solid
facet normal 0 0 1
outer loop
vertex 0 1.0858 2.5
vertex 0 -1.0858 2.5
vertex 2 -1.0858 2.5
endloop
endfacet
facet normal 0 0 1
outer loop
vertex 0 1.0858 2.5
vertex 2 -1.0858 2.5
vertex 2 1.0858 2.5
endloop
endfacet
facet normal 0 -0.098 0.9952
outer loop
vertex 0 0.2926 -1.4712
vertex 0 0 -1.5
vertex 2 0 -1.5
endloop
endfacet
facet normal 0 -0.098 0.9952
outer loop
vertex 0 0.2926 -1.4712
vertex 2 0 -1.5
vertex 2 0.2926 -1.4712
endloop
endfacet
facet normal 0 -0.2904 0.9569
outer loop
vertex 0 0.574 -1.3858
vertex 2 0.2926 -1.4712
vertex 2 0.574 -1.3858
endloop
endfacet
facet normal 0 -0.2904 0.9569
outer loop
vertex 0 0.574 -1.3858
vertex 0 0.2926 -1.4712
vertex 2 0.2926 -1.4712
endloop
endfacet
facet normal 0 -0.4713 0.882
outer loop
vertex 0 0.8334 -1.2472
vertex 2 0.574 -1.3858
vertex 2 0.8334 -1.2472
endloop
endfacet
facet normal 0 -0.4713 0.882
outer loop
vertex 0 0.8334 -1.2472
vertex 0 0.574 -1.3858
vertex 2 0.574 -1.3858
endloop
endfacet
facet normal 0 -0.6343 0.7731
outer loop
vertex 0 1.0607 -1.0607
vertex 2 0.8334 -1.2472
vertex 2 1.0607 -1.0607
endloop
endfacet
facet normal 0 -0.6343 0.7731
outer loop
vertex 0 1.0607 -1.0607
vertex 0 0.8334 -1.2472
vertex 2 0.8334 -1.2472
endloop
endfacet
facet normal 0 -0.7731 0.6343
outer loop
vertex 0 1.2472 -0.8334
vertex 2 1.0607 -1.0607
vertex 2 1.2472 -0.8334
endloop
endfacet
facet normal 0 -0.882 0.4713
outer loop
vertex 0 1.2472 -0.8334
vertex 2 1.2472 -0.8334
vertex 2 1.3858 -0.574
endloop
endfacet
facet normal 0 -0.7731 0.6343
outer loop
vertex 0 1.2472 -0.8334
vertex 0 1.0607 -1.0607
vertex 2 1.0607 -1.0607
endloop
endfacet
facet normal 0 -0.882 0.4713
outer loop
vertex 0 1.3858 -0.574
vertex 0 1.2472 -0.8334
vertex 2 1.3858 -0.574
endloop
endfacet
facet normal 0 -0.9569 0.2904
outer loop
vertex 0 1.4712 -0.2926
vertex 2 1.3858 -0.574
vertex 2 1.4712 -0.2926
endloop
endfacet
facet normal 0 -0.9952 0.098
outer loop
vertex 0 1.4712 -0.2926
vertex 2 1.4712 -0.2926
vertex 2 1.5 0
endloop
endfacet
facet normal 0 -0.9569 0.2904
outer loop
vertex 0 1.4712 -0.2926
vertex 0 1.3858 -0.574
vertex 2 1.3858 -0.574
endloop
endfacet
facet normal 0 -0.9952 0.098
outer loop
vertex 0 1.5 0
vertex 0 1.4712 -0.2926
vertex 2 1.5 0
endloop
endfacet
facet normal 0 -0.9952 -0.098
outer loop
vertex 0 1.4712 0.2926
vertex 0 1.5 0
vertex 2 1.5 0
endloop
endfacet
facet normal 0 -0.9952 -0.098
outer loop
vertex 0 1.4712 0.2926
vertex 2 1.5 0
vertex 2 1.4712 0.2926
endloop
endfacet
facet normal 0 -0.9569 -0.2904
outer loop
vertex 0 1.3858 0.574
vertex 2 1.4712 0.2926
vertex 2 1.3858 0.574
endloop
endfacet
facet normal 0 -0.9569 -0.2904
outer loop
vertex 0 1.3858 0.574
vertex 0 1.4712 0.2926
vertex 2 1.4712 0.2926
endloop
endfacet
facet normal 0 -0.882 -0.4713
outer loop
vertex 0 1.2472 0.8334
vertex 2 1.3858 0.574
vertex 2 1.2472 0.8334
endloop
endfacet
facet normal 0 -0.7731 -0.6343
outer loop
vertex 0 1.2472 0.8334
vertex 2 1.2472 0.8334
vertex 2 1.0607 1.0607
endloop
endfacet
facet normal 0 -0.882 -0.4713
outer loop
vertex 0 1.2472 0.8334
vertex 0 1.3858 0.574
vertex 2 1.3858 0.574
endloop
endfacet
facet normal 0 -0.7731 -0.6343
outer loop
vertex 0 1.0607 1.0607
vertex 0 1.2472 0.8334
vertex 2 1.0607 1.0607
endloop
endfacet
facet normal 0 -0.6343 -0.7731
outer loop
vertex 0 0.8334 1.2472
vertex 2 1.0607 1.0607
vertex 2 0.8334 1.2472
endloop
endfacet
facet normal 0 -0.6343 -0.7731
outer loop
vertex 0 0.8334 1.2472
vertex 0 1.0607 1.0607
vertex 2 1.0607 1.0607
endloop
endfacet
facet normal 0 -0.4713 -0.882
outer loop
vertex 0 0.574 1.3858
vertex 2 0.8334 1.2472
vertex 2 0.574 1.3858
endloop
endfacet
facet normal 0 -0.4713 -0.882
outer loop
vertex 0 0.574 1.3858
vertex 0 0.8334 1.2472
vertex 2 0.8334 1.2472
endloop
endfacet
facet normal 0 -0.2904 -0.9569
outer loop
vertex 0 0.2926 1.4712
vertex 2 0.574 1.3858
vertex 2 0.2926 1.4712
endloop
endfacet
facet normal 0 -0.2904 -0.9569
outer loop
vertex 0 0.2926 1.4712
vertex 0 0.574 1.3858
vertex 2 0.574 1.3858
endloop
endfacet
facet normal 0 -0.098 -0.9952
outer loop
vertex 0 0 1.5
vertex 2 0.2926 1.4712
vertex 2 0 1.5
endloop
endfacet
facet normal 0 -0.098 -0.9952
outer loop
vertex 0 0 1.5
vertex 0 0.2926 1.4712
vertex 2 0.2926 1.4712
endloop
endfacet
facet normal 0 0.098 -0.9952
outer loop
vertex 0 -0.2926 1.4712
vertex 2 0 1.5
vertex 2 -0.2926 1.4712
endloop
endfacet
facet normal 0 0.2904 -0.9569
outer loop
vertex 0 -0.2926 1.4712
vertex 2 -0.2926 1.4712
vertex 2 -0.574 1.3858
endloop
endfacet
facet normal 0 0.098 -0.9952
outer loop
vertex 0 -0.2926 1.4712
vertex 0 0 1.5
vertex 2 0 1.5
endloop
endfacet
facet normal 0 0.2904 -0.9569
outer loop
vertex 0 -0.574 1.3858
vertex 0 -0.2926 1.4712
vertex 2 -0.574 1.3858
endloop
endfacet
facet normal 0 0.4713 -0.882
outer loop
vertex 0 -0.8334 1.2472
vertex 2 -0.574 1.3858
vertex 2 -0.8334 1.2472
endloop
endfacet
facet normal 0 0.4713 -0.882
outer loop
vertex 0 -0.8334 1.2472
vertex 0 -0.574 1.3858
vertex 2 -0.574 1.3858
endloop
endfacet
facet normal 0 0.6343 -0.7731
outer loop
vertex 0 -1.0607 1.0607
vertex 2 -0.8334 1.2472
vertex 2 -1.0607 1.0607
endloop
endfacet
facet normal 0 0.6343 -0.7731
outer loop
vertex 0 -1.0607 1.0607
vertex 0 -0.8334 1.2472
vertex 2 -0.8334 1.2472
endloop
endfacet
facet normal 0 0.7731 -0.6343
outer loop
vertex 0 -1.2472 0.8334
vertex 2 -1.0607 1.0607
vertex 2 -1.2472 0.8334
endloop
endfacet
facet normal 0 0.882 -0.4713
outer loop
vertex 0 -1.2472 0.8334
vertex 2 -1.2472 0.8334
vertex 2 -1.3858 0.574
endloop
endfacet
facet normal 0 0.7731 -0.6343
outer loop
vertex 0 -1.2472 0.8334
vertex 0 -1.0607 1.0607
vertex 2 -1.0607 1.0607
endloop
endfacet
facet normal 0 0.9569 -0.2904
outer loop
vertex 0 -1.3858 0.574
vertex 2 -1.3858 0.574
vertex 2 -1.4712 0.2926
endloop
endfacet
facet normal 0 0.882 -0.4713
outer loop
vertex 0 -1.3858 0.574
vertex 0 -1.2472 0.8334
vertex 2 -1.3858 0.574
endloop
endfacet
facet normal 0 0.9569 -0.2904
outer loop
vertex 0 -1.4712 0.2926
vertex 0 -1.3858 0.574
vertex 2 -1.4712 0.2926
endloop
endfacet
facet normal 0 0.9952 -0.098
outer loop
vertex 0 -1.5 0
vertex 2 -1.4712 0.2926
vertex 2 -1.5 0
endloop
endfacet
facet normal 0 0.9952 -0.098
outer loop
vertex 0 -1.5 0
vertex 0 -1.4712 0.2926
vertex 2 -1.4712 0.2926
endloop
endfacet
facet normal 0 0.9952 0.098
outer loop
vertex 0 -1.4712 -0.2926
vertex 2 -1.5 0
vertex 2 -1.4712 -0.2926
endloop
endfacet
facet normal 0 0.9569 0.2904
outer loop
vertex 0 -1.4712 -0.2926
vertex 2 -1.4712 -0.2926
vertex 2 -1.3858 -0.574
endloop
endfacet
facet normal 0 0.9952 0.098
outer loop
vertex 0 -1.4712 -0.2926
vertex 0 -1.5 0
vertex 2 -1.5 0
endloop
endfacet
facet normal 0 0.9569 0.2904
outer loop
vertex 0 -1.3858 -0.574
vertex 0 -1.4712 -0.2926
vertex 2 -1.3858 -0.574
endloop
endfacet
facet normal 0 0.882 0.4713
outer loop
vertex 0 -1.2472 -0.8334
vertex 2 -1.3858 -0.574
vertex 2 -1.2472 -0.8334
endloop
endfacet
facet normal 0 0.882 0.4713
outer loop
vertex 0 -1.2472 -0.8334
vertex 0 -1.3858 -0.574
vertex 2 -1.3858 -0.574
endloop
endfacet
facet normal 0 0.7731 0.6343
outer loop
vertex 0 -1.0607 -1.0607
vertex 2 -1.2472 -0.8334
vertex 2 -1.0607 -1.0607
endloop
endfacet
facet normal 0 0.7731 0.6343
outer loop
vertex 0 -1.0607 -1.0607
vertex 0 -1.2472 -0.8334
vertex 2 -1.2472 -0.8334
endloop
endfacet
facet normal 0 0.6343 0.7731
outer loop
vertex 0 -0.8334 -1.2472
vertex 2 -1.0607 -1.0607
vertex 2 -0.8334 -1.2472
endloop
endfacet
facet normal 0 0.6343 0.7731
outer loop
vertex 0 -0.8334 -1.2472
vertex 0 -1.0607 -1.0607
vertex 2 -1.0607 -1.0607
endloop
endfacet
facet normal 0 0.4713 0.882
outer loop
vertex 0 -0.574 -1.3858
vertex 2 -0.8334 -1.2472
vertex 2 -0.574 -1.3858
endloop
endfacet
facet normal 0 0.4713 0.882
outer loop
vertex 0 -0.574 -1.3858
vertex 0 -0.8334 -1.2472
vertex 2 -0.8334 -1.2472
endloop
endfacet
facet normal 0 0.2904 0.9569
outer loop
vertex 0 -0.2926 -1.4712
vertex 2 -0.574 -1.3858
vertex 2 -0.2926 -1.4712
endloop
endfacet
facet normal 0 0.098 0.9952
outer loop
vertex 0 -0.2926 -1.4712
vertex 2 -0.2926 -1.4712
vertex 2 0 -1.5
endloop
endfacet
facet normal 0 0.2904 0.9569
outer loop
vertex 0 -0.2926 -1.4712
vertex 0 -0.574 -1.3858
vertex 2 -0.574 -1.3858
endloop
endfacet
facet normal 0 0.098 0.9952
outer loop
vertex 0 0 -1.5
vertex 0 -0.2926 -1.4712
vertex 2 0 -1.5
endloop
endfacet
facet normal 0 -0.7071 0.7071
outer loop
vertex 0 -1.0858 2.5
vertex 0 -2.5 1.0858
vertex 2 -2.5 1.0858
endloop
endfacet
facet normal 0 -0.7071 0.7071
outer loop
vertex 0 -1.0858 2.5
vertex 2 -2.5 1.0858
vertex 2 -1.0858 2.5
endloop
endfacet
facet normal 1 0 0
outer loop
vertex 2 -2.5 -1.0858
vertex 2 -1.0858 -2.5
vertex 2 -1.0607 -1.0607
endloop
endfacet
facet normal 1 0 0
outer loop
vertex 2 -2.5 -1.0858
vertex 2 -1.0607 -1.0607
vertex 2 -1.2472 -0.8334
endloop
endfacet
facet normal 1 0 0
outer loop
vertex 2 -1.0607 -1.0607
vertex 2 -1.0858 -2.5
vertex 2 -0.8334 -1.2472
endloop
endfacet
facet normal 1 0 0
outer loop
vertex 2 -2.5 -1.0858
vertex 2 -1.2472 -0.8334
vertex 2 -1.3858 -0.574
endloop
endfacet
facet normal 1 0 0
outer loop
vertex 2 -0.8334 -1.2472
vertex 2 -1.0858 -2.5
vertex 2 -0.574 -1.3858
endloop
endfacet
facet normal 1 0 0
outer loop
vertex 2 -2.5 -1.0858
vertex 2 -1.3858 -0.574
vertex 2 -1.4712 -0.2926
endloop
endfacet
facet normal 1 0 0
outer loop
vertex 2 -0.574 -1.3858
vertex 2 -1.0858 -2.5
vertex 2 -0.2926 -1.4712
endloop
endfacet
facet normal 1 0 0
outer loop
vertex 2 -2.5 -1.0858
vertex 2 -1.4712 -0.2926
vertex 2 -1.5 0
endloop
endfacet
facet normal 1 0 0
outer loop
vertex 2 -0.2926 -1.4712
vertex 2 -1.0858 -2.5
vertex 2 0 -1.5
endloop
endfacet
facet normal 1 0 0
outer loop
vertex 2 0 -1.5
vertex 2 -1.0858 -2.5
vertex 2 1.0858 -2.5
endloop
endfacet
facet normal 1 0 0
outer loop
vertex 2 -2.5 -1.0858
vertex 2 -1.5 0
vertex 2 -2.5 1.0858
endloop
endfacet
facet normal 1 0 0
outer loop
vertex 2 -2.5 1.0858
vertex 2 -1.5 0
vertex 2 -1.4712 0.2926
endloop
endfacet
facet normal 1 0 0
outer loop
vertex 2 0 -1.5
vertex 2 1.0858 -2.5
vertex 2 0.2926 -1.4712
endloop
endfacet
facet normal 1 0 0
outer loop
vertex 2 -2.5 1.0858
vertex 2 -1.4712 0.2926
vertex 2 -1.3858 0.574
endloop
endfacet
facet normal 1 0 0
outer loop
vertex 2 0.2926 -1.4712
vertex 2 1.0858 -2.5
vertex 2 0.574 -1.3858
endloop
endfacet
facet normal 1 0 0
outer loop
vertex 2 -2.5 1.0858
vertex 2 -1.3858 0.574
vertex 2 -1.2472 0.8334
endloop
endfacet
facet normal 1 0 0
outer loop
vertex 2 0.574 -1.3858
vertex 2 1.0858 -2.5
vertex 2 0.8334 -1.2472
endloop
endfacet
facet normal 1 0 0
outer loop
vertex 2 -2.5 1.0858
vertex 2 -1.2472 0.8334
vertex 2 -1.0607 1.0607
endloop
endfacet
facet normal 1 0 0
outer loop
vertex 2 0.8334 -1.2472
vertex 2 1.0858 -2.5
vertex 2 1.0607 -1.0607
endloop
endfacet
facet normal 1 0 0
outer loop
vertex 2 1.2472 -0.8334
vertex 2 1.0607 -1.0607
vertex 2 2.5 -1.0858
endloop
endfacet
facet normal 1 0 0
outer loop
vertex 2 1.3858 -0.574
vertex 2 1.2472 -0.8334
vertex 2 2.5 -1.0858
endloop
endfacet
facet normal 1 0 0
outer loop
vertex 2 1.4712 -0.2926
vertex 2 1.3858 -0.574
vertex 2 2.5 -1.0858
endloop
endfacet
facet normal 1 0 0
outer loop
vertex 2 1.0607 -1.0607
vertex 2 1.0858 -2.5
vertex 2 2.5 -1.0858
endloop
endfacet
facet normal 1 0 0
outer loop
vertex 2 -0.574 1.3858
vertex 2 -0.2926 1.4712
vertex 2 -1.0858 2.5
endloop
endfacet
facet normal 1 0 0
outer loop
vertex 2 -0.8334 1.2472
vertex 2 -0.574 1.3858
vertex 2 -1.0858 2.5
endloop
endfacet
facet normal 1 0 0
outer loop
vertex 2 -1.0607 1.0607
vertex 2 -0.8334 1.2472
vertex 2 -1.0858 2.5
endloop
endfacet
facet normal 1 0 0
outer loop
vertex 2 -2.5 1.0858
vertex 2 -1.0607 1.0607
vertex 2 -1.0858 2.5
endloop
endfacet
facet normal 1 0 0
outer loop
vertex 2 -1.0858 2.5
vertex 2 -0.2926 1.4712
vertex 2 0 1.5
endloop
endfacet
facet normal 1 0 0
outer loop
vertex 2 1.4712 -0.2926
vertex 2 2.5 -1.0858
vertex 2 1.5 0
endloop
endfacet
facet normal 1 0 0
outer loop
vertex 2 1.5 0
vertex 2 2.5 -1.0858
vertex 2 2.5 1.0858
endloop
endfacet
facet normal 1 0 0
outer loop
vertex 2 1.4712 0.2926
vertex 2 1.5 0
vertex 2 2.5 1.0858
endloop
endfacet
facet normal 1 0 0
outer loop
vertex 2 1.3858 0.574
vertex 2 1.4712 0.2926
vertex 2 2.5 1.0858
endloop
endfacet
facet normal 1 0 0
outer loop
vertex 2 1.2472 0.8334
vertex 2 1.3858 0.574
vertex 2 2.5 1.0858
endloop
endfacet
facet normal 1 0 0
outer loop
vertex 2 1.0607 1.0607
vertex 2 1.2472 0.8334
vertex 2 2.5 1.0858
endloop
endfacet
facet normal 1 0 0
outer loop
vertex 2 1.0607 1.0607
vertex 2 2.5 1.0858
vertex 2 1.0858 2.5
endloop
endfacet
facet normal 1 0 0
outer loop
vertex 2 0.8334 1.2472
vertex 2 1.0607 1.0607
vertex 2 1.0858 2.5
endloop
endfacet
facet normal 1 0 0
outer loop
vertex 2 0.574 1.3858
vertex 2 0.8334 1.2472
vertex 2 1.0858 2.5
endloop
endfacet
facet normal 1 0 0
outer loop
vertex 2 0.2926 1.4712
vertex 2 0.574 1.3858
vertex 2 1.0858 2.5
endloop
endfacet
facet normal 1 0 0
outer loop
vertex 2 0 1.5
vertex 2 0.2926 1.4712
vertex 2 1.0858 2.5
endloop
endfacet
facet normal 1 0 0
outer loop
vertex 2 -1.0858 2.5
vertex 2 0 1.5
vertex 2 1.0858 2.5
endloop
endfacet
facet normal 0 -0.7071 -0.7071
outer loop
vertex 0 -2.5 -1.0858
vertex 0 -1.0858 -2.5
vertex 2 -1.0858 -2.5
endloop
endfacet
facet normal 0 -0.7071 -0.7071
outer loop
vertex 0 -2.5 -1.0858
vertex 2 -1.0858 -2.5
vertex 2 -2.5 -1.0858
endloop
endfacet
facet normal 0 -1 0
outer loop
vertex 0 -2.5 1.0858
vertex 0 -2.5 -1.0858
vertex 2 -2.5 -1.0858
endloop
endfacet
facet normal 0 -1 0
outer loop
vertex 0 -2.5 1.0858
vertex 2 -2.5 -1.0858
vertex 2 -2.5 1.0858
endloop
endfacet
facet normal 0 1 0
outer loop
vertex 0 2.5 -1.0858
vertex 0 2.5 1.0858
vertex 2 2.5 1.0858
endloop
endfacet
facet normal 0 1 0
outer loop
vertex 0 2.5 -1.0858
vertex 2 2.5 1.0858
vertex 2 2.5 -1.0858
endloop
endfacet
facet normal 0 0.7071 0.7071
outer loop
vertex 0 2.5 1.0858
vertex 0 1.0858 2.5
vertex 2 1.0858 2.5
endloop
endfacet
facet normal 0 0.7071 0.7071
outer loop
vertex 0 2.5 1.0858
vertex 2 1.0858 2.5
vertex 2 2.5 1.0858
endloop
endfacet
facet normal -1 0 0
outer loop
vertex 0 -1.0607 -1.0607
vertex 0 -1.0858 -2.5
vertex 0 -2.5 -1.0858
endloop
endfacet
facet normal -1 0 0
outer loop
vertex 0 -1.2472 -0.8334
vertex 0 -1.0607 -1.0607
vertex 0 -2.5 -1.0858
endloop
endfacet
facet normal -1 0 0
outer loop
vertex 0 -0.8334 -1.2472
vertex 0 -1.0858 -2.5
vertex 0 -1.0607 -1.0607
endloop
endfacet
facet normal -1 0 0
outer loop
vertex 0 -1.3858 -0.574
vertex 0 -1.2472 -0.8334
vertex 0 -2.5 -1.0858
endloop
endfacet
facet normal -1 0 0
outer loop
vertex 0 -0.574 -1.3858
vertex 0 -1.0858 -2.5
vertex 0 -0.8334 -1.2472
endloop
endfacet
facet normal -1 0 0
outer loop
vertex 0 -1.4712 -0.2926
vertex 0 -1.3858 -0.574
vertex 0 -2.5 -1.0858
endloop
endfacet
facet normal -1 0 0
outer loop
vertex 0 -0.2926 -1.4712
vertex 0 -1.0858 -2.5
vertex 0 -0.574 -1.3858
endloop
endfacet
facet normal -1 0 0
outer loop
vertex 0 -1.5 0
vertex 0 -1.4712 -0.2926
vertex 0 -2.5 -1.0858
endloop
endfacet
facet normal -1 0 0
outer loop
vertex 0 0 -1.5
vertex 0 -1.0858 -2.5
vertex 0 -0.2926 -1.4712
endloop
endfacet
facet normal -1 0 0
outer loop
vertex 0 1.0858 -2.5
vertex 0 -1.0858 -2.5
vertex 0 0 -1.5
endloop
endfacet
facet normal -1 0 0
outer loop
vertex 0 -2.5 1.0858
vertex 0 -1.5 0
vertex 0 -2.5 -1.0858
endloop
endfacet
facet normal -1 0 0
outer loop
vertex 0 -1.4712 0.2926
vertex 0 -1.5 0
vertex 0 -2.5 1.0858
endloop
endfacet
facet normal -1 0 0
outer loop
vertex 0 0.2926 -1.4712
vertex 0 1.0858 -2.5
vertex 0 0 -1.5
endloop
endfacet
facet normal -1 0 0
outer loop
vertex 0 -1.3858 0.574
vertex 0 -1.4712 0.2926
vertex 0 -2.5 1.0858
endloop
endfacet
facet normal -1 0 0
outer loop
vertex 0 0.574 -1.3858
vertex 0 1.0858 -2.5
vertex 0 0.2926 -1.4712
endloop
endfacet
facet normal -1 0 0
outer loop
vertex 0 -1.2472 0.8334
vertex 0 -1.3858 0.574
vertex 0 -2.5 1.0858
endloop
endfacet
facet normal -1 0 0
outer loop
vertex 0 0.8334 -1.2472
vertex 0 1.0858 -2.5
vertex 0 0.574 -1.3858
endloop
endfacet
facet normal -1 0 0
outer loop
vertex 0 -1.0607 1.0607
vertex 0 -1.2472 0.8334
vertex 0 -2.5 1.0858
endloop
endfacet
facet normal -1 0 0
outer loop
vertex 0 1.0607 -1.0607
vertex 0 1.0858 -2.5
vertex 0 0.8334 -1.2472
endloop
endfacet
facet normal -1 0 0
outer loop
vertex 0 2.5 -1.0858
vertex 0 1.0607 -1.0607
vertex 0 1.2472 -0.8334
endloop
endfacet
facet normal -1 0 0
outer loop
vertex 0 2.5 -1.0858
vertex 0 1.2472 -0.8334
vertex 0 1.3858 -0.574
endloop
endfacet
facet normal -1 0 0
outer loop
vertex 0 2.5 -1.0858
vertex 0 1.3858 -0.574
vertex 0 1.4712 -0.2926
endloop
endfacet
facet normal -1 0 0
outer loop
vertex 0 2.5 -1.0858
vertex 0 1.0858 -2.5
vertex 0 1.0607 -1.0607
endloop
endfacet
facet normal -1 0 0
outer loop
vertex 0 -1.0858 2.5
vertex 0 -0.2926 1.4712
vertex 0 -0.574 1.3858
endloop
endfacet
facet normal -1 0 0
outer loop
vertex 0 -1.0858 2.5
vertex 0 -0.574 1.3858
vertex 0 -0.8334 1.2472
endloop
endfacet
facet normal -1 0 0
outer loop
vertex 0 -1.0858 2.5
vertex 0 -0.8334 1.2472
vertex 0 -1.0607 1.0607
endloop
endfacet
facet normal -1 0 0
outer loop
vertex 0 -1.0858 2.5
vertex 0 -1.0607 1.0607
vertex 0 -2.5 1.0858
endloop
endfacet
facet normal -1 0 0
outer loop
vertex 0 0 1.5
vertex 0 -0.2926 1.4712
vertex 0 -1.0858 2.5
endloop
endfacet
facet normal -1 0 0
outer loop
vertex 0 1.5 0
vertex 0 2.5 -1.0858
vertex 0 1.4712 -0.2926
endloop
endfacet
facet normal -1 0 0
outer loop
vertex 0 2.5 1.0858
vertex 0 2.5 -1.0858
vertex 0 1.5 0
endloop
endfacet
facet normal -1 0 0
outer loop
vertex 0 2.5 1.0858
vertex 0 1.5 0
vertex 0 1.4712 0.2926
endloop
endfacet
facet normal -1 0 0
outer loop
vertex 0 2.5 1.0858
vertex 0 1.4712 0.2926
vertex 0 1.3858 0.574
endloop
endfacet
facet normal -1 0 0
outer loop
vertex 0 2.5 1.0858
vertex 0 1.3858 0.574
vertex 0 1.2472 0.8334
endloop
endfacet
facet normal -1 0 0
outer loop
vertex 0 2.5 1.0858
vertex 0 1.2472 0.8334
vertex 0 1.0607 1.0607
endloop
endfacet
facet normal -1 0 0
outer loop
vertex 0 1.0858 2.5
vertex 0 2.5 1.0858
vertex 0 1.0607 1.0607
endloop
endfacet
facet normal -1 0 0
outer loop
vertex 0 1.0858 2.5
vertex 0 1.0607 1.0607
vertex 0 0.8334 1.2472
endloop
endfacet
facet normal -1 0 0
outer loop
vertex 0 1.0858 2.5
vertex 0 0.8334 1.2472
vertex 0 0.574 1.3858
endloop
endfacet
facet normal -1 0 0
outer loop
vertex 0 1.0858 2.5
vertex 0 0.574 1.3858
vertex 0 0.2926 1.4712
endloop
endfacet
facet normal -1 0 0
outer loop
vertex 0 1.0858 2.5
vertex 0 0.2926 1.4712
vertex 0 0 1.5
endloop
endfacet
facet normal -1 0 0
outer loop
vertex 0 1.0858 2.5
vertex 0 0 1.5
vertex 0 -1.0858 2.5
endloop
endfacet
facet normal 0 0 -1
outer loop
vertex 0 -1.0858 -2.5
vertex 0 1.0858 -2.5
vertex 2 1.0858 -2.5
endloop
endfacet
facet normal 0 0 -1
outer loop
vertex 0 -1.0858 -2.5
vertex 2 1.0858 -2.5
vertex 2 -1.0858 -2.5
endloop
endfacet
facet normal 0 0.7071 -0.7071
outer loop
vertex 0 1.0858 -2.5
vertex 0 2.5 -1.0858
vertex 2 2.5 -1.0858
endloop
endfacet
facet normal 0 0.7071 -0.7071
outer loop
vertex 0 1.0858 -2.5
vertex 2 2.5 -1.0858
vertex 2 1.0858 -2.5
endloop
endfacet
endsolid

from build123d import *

# Parameters (mm, degrees)
SKETCH1_R           = 1.5
BOSS_EXTRUDE1_DEPTH = 2


with BuildPart() as part:
    # Sketch1 → Boss-Extrude1 (new body)
    with BuildSketch(Plane(origin=(0, 0, 0), x_dir=(0, 0, -1), z_dir=(1, 0, 0))):
        Polygon((-1.085786438, 2.5), (1.085786438, 2.5), (2.5, 1.085786438), (2.5, -1.085786438), (1.085786438, -2.5), (-1.085786438, -2.5), (-2.5, -1.085786438), (-2.5, 1.085786438), align=None)
        Circle(SKETCH1_R, mode=Mode.SUBTRACT)
    extrude(amount=BOSS_EXTRUDE1_DEPTH)


solid = part.part
